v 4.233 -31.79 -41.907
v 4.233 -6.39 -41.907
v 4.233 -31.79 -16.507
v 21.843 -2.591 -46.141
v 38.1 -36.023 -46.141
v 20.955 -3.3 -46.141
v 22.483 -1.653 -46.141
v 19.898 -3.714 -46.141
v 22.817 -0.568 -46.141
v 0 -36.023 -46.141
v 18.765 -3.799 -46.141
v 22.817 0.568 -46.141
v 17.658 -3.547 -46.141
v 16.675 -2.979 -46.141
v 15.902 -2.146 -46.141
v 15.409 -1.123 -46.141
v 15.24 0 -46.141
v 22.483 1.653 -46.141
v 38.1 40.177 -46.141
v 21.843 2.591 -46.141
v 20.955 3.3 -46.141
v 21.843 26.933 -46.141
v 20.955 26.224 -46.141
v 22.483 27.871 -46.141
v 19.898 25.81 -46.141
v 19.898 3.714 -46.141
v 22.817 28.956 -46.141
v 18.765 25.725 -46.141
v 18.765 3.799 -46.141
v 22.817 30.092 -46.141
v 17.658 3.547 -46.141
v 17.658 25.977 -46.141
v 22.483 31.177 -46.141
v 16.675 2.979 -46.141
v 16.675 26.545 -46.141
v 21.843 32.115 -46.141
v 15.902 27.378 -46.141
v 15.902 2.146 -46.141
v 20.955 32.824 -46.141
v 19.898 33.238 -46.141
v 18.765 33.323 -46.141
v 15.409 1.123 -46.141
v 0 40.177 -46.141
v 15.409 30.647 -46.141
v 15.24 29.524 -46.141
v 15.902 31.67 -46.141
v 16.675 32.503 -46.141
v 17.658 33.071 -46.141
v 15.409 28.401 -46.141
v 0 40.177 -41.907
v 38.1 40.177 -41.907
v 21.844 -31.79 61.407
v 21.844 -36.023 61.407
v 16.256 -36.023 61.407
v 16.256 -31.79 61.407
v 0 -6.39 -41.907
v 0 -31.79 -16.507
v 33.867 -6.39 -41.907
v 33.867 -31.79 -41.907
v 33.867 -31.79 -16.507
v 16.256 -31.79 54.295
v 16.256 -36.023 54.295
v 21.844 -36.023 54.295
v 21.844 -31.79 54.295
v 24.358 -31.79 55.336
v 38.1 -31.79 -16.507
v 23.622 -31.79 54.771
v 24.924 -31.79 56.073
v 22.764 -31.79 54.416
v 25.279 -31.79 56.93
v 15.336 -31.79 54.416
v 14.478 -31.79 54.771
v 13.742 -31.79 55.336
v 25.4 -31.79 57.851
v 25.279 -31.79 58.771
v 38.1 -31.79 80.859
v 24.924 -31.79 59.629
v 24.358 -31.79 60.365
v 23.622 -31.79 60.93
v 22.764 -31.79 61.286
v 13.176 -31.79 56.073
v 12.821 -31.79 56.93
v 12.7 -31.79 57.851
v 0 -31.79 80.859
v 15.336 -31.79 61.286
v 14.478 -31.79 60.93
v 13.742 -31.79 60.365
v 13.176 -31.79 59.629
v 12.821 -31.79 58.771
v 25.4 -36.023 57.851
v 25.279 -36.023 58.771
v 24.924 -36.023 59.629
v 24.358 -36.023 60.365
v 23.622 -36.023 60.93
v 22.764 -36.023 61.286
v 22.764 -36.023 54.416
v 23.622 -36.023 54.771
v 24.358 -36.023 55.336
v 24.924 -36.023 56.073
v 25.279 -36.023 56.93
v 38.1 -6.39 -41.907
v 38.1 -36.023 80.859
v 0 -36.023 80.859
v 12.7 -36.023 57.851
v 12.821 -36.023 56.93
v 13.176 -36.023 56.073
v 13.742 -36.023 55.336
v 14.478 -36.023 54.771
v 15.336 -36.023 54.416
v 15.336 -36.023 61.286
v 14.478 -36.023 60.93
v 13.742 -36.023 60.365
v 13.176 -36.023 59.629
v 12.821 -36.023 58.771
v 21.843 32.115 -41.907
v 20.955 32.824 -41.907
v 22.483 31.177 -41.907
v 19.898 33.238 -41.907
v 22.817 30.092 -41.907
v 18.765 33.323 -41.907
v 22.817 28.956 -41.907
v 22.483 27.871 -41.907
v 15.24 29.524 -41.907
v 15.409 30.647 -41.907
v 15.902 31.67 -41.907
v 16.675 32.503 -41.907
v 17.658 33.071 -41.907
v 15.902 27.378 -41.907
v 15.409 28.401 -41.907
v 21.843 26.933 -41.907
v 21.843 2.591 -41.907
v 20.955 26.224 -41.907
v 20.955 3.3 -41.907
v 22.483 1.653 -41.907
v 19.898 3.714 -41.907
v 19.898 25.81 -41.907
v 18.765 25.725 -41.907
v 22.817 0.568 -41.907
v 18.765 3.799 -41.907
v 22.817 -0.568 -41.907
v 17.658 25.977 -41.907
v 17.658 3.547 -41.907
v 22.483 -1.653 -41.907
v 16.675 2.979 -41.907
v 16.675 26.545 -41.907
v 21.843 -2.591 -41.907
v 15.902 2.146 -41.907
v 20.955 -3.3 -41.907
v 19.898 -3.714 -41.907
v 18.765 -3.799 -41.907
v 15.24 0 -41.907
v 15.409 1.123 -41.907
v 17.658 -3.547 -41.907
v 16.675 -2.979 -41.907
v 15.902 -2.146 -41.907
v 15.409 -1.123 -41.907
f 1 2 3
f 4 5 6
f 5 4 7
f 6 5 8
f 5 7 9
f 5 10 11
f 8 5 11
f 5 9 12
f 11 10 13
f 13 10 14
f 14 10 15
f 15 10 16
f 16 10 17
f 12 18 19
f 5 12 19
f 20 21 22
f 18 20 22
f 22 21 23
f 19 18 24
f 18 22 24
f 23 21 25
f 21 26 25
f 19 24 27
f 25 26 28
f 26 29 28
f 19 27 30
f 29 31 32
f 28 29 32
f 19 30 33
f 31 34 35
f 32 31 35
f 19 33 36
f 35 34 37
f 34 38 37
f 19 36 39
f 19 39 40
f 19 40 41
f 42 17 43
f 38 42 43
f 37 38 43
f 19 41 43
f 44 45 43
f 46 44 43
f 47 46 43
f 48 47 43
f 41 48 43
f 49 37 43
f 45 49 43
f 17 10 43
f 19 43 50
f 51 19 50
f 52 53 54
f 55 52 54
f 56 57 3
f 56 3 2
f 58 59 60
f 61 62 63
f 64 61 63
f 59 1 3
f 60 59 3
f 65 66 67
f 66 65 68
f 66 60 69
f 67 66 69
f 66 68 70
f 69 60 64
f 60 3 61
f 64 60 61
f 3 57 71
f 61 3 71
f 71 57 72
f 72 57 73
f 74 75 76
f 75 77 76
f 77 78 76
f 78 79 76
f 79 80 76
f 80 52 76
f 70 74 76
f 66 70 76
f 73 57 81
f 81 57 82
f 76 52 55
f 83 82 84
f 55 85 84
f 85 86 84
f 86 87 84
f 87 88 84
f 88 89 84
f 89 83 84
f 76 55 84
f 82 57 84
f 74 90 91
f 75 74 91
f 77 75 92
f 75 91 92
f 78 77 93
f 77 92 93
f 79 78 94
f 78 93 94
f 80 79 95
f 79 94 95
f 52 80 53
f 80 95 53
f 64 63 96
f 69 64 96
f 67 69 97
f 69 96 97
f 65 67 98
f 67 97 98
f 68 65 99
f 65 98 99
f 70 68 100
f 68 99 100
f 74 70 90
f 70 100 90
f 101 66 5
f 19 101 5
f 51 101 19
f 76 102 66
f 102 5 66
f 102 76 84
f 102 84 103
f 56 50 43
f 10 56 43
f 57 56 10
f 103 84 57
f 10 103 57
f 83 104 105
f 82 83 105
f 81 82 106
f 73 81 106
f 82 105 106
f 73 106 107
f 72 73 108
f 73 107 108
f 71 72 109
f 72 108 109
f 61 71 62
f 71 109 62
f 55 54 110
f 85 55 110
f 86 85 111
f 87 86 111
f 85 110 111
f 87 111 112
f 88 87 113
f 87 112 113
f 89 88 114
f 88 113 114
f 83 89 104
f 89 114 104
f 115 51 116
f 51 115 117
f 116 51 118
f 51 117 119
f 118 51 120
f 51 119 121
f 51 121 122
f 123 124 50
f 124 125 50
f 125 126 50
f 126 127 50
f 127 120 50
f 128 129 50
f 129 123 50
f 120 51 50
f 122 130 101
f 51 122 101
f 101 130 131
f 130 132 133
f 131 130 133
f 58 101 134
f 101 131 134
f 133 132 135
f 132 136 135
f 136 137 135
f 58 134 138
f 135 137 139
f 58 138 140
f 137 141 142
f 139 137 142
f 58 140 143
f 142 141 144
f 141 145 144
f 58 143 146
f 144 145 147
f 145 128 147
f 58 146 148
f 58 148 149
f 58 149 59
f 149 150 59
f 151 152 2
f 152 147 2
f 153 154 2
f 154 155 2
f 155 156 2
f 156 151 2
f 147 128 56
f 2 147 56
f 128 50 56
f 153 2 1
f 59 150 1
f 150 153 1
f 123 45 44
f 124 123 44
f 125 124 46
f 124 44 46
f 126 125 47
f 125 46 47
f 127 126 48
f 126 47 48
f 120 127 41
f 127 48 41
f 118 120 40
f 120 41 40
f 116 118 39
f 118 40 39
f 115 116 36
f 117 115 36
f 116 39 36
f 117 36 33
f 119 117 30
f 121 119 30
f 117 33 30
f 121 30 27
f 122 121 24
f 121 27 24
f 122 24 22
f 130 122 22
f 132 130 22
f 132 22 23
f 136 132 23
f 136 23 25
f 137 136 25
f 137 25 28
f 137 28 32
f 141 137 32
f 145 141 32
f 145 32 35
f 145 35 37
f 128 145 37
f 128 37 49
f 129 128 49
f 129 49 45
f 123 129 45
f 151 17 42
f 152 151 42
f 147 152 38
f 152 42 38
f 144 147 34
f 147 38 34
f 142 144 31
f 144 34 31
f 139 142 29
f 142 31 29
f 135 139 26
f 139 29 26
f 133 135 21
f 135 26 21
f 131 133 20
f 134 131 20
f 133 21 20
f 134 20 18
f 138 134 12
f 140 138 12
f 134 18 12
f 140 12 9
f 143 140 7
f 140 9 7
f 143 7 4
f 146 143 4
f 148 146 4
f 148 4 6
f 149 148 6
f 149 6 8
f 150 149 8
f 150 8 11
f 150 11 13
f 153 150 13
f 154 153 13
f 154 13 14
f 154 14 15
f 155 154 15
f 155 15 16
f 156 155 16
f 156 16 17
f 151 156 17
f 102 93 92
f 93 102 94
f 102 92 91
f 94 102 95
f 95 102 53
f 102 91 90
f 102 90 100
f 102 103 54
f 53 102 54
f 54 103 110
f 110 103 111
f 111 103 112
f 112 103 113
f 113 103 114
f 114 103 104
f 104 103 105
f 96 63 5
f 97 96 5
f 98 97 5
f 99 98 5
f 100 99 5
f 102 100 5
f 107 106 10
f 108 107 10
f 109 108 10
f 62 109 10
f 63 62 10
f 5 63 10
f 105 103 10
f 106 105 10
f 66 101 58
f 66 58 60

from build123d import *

# Parameters (mm, degrees)
F1_DEPTH = 38.1
F3_DEPTH = 25.4
F5_DEPTH = 4.2333333333
F7_DEPTH = 4.2333333333
F9_D     = 7.62
F9_DEPTH = 12.7
F9_TIP   = 2.2892789585


with BuildPart() as f1:
    # F0 (on Right) → F1 (new body)
    with BuildSketch(Plane.YZ):
        Polygon((-31.7897086839, 80.859287534), (-36.0230420173, 80.859287534), (-36.0230420173, -46.140712466), (40.1769579827, -46.140712466), (40.1769579827, -41.9073791327), (-31.7897086839, -41.9073791327), align=None)
    extrude(amount=F1_DEPTH)

    # F2 (on face) → F3 (cut)
    with BuildSketch(Plane.XZ.offset(36.0230420173)):
        with BuildLine():
            Line((21.844, 61.4068451581), (16.256, 61.4068451581))
            ThreePointArc((16.256, 61.4068451581), (13.7415282861, 60.365316872), (12.7, 57.8508451581))
            ThreePointArc((12.7, 57.8508451581), (13.7415282861, 55.3363734442), (16.256, 54.2948451581))
            Line((16.256, 54.2948451581), (21.844, 54.2948451581))
            ThreePointArc((21.844, 54.2948451581), (24.3584717139, 55.3363734442), (25.4, 57.8508451581))
            ThreePointArc((25.4, 57.8508451581), (24.3584717139, 60.365316872), (21.844, 61.4068451581))
        make_face()
    extrude(amount=-F3_DEPTH, mode=Mode.SUBTRACT)

    # F4 (on face) → F5 (join)
    with BuildSketch(Plane.YZ.offset(38.1)):
        Polygon((-31.7897086839, -41.9073791327), (-6.3897086839, -41.9073791327), (-31.7897086839, -16.5073791327), align=None)
    extrude(amount=-F5_DEPTH)

    # F6 (on face) → F7 (join)
    with BuildSketch(Plane(origin=(0, 0, 0), x_dir=(0, -1, 0), z_dir=(-1, 0, 0))):
        Polygon((31.7897086839, -41.9073791327), (31.7897086839, -16.5073791327), (6.3897086839, -41.9073791327), align=None)
    extrude(amount=-F7_DEPTH)

    # F9
    with Locations(Plane.XY.offset(-41.9073791327)):
        with Locations((19.05, 0), (19.05, 29.5239835978)):
            Hole(F9_D / 2, depth=F9_DEPTH)
            with Locations((0, 0, -(F9_DEPTH + F9_TIP / 2))):  # 118° drill point
                Cone(0, F9_D / 2, F9_TIP, mode=Mode.SUBTRACT)


solid = f1.part
